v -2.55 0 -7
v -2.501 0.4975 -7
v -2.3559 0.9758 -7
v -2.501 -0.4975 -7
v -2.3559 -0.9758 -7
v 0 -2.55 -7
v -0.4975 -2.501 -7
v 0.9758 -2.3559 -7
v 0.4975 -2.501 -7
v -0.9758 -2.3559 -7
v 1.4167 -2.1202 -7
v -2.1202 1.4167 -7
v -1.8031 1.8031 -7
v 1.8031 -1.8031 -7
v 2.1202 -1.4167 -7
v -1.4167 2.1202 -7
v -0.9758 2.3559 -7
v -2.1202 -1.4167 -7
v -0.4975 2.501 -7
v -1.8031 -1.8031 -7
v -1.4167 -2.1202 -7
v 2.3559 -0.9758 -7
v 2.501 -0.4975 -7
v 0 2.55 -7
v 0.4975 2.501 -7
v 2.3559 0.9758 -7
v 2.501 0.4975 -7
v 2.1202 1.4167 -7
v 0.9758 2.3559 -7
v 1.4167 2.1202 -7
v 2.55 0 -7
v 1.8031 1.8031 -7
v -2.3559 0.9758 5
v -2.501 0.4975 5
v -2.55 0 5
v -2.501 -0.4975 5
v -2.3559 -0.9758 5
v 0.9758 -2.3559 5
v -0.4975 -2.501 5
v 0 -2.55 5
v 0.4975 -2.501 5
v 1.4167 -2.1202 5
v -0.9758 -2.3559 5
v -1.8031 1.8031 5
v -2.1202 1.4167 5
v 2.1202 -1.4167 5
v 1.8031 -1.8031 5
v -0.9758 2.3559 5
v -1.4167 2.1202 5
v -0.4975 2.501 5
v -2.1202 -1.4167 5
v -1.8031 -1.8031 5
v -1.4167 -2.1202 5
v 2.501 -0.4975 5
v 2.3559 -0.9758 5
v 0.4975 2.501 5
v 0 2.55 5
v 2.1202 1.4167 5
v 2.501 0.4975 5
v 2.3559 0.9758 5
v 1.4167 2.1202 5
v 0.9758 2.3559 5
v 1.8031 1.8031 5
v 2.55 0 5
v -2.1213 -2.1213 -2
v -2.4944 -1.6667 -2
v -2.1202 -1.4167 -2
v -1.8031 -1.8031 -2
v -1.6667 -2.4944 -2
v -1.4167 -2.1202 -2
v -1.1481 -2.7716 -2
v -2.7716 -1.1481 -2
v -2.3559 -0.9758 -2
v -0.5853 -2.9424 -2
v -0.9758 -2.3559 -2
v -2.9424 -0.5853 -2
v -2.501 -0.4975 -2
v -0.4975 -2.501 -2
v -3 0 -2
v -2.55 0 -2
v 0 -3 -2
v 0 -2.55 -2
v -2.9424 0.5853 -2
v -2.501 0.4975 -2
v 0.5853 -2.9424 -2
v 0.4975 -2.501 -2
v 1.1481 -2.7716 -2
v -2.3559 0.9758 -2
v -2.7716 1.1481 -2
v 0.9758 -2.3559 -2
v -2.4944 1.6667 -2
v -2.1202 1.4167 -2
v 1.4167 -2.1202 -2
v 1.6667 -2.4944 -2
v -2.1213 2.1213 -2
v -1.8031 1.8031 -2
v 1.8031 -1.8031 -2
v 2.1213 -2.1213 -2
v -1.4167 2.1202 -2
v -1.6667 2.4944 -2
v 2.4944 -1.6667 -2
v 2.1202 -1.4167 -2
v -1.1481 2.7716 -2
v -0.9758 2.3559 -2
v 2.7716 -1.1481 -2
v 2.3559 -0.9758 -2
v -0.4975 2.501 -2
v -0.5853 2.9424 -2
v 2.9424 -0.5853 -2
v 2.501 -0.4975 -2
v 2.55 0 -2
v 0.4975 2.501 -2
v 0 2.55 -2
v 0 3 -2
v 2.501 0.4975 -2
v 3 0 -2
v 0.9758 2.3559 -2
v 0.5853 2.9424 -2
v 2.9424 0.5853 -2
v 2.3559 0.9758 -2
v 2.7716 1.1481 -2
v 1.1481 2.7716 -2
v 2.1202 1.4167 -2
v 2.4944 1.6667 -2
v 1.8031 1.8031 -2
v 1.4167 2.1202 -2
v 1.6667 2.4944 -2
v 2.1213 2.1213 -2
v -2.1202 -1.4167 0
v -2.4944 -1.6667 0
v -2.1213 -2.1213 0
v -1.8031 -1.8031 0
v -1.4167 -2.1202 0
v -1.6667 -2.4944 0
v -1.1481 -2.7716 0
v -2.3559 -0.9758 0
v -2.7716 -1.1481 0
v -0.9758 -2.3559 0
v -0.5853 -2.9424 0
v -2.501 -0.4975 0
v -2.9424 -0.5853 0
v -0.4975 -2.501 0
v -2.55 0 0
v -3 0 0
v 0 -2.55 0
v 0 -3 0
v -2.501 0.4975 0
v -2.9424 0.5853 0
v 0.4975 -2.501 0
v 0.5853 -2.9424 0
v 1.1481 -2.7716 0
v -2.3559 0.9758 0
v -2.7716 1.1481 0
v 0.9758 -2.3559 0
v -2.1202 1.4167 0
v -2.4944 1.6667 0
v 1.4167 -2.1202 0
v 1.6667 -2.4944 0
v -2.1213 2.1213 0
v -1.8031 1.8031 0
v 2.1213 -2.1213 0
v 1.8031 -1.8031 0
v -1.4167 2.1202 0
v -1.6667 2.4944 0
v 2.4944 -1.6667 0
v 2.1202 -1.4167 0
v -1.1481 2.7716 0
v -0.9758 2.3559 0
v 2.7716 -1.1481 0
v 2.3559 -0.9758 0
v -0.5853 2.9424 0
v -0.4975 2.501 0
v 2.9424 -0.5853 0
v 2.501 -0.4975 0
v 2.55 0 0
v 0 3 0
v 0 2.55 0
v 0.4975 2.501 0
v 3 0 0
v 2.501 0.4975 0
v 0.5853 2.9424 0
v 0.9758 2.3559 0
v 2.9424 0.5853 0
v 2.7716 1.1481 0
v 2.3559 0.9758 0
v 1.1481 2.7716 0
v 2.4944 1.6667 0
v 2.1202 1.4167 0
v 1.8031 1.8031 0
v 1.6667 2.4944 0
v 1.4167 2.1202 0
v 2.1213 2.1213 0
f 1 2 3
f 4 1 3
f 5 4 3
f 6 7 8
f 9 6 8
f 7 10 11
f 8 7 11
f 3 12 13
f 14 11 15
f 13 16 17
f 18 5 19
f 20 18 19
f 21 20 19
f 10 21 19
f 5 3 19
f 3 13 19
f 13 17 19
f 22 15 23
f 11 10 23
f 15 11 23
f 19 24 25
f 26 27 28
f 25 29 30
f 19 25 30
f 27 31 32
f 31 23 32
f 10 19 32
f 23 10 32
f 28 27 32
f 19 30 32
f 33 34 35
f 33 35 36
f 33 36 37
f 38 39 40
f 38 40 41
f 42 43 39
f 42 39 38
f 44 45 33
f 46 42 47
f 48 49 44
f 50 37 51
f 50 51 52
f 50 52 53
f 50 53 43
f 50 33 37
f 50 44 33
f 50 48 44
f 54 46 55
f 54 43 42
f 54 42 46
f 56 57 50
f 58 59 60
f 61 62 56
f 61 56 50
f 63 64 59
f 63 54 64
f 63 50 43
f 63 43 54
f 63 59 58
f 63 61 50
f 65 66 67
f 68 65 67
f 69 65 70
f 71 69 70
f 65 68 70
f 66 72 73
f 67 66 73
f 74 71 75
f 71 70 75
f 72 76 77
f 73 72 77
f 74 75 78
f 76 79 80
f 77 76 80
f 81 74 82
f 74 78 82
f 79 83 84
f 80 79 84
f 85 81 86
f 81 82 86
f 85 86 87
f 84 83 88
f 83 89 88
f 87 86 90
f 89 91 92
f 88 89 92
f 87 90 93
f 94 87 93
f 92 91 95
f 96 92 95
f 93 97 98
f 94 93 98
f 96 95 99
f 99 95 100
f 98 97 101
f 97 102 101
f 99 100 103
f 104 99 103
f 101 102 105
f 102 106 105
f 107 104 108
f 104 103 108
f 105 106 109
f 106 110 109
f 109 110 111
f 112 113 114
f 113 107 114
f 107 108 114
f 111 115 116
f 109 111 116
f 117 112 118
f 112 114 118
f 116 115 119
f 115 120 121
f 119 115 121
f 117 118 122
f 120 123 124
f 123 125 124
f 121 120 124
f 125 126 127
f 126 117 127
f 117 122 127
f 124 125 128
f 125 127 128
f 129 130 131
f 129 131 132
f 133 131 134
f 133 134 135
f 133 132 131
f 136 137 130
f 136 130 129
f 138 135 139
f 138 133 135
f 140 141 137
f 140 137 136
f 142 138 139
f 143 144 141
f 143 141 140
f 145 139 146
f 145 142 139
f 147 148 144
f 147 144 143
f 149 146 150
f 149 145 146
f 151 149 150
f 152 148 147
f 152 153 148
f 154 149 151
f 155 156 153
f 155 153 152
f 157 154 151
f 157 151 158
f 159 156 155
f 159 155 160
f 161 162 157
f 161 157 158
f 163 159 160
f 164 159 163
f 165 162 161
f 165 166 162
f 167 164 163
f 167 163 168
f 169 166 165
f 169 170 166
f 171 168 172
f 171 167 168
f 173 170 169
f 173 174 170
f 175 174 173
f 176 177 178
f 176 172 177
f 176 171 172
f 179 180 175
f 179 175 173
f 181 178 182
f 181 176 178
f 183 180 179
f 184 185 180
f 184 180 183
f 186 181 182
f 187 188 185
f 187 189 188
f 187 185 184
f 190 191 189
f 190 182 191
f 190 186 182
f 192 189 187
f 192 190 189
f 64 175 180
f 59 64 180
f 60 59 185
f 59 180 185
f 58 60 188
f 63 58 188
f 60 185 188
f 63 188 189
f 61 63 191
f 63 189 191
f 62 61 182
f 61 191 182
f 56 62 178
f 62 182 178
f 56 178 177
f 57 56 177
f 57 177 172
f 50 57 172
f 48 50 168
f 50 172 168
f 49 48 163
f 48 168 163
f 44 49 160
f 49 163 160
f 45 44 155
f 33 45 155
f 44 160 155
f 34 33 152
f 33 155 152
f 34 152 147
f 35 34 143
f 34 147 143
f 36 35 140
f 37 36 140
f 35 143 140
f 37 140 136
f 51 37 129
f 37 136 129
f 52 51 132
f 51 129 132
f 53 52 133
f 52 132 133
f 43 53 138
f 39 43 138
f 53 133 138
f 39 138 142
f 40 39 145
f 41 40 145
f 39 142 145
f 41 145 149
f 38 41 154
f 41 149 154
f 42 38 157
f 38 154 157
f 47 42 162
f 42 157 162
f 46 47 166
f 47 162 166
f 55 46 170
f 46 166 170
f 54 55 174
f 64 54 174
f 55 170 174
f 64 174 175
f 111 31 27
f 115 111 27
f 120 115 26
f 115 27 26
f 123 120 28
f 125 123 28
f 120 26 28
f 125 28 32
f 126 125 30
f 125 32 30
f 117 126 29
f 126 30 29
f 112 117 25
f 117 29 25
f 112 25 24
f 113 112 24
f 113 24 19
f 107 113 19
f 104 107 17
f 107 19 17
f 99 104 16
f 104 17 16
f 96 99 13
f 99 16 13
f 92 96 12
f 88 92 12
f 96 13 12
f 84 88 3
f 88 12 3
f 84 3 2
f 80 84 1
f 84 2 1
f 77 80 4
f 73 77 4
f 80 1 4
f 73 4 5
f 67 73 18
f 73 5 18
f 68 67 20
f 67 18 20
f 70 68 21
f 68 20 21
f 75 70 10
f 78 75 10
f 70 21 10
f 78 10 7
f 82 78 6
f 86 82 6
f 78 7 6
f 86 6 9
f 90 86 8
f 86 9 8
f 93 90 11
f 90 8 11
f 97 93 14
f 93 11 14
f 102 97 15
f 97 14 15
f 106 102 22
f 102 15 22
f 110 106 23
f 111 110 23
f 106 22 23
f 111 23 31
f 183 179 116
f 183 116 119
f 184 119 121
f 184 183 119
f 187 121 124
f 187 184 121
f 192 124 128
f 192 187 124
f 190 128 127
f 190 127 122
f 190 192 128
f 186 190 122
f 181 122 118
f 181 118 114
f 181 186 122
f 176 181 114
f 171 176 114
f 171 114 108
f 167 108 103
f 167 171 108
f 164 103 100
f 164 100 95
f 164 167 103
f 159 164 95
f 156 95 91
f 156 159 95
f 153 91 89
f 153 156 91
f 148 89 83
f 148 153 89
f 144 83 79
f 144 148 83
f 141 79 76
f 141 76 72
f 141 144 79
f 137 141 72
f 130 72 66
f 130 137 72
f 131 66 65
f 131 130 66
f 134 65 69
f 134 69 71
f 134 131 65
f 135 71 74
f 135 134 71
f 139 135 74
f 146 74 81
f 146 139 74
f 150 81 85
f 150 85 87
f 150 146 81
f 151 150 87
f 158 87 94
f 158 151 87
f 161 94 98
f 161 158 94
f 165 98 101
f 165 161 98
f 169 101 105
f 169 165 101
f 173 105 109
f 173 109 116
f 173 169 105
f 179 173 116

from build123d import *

# Parameters (mm, degrees)
SKETCH1_R           = 2.55
BOSS_EXTRUDE1_DEPTH = 5
SKETCH2_R           = 3
BOSS_EXTRUDE2_DEPTH = 2
BOSS_EXTRUDE3_START = -7
SKETCH1_2_R         = 2.55
BOSS_EXTRUDE3_DEPTH = 5


with BuildPart() as part:
    # Sketch1 → Boss-Extrude1 (new body)
    with BuildSketch(Plane.XY):
        Circle(SKETCH1_R)
    extrude(amount=BOSS_EXTRUDE1_DEPTH)

    # Sketch2 → Boss-Extrude2 (add)
    with BuildSketch(Plane.XY):
        Circle(SKETCH2_R)
    extrude(amount=-BOSS_EXTRUDE2_DEPTH)

    # Sketch1<2> → Boss-Extrude3 (add)
    with BuildSketch(Plane.XY.offset(BOSS_EXTRUDE3_START)):
        Circle(SKETCH1_2_R)
    extrude(amount=BOSS_EXTRUDE3_DEPTH)


solid = part.part
